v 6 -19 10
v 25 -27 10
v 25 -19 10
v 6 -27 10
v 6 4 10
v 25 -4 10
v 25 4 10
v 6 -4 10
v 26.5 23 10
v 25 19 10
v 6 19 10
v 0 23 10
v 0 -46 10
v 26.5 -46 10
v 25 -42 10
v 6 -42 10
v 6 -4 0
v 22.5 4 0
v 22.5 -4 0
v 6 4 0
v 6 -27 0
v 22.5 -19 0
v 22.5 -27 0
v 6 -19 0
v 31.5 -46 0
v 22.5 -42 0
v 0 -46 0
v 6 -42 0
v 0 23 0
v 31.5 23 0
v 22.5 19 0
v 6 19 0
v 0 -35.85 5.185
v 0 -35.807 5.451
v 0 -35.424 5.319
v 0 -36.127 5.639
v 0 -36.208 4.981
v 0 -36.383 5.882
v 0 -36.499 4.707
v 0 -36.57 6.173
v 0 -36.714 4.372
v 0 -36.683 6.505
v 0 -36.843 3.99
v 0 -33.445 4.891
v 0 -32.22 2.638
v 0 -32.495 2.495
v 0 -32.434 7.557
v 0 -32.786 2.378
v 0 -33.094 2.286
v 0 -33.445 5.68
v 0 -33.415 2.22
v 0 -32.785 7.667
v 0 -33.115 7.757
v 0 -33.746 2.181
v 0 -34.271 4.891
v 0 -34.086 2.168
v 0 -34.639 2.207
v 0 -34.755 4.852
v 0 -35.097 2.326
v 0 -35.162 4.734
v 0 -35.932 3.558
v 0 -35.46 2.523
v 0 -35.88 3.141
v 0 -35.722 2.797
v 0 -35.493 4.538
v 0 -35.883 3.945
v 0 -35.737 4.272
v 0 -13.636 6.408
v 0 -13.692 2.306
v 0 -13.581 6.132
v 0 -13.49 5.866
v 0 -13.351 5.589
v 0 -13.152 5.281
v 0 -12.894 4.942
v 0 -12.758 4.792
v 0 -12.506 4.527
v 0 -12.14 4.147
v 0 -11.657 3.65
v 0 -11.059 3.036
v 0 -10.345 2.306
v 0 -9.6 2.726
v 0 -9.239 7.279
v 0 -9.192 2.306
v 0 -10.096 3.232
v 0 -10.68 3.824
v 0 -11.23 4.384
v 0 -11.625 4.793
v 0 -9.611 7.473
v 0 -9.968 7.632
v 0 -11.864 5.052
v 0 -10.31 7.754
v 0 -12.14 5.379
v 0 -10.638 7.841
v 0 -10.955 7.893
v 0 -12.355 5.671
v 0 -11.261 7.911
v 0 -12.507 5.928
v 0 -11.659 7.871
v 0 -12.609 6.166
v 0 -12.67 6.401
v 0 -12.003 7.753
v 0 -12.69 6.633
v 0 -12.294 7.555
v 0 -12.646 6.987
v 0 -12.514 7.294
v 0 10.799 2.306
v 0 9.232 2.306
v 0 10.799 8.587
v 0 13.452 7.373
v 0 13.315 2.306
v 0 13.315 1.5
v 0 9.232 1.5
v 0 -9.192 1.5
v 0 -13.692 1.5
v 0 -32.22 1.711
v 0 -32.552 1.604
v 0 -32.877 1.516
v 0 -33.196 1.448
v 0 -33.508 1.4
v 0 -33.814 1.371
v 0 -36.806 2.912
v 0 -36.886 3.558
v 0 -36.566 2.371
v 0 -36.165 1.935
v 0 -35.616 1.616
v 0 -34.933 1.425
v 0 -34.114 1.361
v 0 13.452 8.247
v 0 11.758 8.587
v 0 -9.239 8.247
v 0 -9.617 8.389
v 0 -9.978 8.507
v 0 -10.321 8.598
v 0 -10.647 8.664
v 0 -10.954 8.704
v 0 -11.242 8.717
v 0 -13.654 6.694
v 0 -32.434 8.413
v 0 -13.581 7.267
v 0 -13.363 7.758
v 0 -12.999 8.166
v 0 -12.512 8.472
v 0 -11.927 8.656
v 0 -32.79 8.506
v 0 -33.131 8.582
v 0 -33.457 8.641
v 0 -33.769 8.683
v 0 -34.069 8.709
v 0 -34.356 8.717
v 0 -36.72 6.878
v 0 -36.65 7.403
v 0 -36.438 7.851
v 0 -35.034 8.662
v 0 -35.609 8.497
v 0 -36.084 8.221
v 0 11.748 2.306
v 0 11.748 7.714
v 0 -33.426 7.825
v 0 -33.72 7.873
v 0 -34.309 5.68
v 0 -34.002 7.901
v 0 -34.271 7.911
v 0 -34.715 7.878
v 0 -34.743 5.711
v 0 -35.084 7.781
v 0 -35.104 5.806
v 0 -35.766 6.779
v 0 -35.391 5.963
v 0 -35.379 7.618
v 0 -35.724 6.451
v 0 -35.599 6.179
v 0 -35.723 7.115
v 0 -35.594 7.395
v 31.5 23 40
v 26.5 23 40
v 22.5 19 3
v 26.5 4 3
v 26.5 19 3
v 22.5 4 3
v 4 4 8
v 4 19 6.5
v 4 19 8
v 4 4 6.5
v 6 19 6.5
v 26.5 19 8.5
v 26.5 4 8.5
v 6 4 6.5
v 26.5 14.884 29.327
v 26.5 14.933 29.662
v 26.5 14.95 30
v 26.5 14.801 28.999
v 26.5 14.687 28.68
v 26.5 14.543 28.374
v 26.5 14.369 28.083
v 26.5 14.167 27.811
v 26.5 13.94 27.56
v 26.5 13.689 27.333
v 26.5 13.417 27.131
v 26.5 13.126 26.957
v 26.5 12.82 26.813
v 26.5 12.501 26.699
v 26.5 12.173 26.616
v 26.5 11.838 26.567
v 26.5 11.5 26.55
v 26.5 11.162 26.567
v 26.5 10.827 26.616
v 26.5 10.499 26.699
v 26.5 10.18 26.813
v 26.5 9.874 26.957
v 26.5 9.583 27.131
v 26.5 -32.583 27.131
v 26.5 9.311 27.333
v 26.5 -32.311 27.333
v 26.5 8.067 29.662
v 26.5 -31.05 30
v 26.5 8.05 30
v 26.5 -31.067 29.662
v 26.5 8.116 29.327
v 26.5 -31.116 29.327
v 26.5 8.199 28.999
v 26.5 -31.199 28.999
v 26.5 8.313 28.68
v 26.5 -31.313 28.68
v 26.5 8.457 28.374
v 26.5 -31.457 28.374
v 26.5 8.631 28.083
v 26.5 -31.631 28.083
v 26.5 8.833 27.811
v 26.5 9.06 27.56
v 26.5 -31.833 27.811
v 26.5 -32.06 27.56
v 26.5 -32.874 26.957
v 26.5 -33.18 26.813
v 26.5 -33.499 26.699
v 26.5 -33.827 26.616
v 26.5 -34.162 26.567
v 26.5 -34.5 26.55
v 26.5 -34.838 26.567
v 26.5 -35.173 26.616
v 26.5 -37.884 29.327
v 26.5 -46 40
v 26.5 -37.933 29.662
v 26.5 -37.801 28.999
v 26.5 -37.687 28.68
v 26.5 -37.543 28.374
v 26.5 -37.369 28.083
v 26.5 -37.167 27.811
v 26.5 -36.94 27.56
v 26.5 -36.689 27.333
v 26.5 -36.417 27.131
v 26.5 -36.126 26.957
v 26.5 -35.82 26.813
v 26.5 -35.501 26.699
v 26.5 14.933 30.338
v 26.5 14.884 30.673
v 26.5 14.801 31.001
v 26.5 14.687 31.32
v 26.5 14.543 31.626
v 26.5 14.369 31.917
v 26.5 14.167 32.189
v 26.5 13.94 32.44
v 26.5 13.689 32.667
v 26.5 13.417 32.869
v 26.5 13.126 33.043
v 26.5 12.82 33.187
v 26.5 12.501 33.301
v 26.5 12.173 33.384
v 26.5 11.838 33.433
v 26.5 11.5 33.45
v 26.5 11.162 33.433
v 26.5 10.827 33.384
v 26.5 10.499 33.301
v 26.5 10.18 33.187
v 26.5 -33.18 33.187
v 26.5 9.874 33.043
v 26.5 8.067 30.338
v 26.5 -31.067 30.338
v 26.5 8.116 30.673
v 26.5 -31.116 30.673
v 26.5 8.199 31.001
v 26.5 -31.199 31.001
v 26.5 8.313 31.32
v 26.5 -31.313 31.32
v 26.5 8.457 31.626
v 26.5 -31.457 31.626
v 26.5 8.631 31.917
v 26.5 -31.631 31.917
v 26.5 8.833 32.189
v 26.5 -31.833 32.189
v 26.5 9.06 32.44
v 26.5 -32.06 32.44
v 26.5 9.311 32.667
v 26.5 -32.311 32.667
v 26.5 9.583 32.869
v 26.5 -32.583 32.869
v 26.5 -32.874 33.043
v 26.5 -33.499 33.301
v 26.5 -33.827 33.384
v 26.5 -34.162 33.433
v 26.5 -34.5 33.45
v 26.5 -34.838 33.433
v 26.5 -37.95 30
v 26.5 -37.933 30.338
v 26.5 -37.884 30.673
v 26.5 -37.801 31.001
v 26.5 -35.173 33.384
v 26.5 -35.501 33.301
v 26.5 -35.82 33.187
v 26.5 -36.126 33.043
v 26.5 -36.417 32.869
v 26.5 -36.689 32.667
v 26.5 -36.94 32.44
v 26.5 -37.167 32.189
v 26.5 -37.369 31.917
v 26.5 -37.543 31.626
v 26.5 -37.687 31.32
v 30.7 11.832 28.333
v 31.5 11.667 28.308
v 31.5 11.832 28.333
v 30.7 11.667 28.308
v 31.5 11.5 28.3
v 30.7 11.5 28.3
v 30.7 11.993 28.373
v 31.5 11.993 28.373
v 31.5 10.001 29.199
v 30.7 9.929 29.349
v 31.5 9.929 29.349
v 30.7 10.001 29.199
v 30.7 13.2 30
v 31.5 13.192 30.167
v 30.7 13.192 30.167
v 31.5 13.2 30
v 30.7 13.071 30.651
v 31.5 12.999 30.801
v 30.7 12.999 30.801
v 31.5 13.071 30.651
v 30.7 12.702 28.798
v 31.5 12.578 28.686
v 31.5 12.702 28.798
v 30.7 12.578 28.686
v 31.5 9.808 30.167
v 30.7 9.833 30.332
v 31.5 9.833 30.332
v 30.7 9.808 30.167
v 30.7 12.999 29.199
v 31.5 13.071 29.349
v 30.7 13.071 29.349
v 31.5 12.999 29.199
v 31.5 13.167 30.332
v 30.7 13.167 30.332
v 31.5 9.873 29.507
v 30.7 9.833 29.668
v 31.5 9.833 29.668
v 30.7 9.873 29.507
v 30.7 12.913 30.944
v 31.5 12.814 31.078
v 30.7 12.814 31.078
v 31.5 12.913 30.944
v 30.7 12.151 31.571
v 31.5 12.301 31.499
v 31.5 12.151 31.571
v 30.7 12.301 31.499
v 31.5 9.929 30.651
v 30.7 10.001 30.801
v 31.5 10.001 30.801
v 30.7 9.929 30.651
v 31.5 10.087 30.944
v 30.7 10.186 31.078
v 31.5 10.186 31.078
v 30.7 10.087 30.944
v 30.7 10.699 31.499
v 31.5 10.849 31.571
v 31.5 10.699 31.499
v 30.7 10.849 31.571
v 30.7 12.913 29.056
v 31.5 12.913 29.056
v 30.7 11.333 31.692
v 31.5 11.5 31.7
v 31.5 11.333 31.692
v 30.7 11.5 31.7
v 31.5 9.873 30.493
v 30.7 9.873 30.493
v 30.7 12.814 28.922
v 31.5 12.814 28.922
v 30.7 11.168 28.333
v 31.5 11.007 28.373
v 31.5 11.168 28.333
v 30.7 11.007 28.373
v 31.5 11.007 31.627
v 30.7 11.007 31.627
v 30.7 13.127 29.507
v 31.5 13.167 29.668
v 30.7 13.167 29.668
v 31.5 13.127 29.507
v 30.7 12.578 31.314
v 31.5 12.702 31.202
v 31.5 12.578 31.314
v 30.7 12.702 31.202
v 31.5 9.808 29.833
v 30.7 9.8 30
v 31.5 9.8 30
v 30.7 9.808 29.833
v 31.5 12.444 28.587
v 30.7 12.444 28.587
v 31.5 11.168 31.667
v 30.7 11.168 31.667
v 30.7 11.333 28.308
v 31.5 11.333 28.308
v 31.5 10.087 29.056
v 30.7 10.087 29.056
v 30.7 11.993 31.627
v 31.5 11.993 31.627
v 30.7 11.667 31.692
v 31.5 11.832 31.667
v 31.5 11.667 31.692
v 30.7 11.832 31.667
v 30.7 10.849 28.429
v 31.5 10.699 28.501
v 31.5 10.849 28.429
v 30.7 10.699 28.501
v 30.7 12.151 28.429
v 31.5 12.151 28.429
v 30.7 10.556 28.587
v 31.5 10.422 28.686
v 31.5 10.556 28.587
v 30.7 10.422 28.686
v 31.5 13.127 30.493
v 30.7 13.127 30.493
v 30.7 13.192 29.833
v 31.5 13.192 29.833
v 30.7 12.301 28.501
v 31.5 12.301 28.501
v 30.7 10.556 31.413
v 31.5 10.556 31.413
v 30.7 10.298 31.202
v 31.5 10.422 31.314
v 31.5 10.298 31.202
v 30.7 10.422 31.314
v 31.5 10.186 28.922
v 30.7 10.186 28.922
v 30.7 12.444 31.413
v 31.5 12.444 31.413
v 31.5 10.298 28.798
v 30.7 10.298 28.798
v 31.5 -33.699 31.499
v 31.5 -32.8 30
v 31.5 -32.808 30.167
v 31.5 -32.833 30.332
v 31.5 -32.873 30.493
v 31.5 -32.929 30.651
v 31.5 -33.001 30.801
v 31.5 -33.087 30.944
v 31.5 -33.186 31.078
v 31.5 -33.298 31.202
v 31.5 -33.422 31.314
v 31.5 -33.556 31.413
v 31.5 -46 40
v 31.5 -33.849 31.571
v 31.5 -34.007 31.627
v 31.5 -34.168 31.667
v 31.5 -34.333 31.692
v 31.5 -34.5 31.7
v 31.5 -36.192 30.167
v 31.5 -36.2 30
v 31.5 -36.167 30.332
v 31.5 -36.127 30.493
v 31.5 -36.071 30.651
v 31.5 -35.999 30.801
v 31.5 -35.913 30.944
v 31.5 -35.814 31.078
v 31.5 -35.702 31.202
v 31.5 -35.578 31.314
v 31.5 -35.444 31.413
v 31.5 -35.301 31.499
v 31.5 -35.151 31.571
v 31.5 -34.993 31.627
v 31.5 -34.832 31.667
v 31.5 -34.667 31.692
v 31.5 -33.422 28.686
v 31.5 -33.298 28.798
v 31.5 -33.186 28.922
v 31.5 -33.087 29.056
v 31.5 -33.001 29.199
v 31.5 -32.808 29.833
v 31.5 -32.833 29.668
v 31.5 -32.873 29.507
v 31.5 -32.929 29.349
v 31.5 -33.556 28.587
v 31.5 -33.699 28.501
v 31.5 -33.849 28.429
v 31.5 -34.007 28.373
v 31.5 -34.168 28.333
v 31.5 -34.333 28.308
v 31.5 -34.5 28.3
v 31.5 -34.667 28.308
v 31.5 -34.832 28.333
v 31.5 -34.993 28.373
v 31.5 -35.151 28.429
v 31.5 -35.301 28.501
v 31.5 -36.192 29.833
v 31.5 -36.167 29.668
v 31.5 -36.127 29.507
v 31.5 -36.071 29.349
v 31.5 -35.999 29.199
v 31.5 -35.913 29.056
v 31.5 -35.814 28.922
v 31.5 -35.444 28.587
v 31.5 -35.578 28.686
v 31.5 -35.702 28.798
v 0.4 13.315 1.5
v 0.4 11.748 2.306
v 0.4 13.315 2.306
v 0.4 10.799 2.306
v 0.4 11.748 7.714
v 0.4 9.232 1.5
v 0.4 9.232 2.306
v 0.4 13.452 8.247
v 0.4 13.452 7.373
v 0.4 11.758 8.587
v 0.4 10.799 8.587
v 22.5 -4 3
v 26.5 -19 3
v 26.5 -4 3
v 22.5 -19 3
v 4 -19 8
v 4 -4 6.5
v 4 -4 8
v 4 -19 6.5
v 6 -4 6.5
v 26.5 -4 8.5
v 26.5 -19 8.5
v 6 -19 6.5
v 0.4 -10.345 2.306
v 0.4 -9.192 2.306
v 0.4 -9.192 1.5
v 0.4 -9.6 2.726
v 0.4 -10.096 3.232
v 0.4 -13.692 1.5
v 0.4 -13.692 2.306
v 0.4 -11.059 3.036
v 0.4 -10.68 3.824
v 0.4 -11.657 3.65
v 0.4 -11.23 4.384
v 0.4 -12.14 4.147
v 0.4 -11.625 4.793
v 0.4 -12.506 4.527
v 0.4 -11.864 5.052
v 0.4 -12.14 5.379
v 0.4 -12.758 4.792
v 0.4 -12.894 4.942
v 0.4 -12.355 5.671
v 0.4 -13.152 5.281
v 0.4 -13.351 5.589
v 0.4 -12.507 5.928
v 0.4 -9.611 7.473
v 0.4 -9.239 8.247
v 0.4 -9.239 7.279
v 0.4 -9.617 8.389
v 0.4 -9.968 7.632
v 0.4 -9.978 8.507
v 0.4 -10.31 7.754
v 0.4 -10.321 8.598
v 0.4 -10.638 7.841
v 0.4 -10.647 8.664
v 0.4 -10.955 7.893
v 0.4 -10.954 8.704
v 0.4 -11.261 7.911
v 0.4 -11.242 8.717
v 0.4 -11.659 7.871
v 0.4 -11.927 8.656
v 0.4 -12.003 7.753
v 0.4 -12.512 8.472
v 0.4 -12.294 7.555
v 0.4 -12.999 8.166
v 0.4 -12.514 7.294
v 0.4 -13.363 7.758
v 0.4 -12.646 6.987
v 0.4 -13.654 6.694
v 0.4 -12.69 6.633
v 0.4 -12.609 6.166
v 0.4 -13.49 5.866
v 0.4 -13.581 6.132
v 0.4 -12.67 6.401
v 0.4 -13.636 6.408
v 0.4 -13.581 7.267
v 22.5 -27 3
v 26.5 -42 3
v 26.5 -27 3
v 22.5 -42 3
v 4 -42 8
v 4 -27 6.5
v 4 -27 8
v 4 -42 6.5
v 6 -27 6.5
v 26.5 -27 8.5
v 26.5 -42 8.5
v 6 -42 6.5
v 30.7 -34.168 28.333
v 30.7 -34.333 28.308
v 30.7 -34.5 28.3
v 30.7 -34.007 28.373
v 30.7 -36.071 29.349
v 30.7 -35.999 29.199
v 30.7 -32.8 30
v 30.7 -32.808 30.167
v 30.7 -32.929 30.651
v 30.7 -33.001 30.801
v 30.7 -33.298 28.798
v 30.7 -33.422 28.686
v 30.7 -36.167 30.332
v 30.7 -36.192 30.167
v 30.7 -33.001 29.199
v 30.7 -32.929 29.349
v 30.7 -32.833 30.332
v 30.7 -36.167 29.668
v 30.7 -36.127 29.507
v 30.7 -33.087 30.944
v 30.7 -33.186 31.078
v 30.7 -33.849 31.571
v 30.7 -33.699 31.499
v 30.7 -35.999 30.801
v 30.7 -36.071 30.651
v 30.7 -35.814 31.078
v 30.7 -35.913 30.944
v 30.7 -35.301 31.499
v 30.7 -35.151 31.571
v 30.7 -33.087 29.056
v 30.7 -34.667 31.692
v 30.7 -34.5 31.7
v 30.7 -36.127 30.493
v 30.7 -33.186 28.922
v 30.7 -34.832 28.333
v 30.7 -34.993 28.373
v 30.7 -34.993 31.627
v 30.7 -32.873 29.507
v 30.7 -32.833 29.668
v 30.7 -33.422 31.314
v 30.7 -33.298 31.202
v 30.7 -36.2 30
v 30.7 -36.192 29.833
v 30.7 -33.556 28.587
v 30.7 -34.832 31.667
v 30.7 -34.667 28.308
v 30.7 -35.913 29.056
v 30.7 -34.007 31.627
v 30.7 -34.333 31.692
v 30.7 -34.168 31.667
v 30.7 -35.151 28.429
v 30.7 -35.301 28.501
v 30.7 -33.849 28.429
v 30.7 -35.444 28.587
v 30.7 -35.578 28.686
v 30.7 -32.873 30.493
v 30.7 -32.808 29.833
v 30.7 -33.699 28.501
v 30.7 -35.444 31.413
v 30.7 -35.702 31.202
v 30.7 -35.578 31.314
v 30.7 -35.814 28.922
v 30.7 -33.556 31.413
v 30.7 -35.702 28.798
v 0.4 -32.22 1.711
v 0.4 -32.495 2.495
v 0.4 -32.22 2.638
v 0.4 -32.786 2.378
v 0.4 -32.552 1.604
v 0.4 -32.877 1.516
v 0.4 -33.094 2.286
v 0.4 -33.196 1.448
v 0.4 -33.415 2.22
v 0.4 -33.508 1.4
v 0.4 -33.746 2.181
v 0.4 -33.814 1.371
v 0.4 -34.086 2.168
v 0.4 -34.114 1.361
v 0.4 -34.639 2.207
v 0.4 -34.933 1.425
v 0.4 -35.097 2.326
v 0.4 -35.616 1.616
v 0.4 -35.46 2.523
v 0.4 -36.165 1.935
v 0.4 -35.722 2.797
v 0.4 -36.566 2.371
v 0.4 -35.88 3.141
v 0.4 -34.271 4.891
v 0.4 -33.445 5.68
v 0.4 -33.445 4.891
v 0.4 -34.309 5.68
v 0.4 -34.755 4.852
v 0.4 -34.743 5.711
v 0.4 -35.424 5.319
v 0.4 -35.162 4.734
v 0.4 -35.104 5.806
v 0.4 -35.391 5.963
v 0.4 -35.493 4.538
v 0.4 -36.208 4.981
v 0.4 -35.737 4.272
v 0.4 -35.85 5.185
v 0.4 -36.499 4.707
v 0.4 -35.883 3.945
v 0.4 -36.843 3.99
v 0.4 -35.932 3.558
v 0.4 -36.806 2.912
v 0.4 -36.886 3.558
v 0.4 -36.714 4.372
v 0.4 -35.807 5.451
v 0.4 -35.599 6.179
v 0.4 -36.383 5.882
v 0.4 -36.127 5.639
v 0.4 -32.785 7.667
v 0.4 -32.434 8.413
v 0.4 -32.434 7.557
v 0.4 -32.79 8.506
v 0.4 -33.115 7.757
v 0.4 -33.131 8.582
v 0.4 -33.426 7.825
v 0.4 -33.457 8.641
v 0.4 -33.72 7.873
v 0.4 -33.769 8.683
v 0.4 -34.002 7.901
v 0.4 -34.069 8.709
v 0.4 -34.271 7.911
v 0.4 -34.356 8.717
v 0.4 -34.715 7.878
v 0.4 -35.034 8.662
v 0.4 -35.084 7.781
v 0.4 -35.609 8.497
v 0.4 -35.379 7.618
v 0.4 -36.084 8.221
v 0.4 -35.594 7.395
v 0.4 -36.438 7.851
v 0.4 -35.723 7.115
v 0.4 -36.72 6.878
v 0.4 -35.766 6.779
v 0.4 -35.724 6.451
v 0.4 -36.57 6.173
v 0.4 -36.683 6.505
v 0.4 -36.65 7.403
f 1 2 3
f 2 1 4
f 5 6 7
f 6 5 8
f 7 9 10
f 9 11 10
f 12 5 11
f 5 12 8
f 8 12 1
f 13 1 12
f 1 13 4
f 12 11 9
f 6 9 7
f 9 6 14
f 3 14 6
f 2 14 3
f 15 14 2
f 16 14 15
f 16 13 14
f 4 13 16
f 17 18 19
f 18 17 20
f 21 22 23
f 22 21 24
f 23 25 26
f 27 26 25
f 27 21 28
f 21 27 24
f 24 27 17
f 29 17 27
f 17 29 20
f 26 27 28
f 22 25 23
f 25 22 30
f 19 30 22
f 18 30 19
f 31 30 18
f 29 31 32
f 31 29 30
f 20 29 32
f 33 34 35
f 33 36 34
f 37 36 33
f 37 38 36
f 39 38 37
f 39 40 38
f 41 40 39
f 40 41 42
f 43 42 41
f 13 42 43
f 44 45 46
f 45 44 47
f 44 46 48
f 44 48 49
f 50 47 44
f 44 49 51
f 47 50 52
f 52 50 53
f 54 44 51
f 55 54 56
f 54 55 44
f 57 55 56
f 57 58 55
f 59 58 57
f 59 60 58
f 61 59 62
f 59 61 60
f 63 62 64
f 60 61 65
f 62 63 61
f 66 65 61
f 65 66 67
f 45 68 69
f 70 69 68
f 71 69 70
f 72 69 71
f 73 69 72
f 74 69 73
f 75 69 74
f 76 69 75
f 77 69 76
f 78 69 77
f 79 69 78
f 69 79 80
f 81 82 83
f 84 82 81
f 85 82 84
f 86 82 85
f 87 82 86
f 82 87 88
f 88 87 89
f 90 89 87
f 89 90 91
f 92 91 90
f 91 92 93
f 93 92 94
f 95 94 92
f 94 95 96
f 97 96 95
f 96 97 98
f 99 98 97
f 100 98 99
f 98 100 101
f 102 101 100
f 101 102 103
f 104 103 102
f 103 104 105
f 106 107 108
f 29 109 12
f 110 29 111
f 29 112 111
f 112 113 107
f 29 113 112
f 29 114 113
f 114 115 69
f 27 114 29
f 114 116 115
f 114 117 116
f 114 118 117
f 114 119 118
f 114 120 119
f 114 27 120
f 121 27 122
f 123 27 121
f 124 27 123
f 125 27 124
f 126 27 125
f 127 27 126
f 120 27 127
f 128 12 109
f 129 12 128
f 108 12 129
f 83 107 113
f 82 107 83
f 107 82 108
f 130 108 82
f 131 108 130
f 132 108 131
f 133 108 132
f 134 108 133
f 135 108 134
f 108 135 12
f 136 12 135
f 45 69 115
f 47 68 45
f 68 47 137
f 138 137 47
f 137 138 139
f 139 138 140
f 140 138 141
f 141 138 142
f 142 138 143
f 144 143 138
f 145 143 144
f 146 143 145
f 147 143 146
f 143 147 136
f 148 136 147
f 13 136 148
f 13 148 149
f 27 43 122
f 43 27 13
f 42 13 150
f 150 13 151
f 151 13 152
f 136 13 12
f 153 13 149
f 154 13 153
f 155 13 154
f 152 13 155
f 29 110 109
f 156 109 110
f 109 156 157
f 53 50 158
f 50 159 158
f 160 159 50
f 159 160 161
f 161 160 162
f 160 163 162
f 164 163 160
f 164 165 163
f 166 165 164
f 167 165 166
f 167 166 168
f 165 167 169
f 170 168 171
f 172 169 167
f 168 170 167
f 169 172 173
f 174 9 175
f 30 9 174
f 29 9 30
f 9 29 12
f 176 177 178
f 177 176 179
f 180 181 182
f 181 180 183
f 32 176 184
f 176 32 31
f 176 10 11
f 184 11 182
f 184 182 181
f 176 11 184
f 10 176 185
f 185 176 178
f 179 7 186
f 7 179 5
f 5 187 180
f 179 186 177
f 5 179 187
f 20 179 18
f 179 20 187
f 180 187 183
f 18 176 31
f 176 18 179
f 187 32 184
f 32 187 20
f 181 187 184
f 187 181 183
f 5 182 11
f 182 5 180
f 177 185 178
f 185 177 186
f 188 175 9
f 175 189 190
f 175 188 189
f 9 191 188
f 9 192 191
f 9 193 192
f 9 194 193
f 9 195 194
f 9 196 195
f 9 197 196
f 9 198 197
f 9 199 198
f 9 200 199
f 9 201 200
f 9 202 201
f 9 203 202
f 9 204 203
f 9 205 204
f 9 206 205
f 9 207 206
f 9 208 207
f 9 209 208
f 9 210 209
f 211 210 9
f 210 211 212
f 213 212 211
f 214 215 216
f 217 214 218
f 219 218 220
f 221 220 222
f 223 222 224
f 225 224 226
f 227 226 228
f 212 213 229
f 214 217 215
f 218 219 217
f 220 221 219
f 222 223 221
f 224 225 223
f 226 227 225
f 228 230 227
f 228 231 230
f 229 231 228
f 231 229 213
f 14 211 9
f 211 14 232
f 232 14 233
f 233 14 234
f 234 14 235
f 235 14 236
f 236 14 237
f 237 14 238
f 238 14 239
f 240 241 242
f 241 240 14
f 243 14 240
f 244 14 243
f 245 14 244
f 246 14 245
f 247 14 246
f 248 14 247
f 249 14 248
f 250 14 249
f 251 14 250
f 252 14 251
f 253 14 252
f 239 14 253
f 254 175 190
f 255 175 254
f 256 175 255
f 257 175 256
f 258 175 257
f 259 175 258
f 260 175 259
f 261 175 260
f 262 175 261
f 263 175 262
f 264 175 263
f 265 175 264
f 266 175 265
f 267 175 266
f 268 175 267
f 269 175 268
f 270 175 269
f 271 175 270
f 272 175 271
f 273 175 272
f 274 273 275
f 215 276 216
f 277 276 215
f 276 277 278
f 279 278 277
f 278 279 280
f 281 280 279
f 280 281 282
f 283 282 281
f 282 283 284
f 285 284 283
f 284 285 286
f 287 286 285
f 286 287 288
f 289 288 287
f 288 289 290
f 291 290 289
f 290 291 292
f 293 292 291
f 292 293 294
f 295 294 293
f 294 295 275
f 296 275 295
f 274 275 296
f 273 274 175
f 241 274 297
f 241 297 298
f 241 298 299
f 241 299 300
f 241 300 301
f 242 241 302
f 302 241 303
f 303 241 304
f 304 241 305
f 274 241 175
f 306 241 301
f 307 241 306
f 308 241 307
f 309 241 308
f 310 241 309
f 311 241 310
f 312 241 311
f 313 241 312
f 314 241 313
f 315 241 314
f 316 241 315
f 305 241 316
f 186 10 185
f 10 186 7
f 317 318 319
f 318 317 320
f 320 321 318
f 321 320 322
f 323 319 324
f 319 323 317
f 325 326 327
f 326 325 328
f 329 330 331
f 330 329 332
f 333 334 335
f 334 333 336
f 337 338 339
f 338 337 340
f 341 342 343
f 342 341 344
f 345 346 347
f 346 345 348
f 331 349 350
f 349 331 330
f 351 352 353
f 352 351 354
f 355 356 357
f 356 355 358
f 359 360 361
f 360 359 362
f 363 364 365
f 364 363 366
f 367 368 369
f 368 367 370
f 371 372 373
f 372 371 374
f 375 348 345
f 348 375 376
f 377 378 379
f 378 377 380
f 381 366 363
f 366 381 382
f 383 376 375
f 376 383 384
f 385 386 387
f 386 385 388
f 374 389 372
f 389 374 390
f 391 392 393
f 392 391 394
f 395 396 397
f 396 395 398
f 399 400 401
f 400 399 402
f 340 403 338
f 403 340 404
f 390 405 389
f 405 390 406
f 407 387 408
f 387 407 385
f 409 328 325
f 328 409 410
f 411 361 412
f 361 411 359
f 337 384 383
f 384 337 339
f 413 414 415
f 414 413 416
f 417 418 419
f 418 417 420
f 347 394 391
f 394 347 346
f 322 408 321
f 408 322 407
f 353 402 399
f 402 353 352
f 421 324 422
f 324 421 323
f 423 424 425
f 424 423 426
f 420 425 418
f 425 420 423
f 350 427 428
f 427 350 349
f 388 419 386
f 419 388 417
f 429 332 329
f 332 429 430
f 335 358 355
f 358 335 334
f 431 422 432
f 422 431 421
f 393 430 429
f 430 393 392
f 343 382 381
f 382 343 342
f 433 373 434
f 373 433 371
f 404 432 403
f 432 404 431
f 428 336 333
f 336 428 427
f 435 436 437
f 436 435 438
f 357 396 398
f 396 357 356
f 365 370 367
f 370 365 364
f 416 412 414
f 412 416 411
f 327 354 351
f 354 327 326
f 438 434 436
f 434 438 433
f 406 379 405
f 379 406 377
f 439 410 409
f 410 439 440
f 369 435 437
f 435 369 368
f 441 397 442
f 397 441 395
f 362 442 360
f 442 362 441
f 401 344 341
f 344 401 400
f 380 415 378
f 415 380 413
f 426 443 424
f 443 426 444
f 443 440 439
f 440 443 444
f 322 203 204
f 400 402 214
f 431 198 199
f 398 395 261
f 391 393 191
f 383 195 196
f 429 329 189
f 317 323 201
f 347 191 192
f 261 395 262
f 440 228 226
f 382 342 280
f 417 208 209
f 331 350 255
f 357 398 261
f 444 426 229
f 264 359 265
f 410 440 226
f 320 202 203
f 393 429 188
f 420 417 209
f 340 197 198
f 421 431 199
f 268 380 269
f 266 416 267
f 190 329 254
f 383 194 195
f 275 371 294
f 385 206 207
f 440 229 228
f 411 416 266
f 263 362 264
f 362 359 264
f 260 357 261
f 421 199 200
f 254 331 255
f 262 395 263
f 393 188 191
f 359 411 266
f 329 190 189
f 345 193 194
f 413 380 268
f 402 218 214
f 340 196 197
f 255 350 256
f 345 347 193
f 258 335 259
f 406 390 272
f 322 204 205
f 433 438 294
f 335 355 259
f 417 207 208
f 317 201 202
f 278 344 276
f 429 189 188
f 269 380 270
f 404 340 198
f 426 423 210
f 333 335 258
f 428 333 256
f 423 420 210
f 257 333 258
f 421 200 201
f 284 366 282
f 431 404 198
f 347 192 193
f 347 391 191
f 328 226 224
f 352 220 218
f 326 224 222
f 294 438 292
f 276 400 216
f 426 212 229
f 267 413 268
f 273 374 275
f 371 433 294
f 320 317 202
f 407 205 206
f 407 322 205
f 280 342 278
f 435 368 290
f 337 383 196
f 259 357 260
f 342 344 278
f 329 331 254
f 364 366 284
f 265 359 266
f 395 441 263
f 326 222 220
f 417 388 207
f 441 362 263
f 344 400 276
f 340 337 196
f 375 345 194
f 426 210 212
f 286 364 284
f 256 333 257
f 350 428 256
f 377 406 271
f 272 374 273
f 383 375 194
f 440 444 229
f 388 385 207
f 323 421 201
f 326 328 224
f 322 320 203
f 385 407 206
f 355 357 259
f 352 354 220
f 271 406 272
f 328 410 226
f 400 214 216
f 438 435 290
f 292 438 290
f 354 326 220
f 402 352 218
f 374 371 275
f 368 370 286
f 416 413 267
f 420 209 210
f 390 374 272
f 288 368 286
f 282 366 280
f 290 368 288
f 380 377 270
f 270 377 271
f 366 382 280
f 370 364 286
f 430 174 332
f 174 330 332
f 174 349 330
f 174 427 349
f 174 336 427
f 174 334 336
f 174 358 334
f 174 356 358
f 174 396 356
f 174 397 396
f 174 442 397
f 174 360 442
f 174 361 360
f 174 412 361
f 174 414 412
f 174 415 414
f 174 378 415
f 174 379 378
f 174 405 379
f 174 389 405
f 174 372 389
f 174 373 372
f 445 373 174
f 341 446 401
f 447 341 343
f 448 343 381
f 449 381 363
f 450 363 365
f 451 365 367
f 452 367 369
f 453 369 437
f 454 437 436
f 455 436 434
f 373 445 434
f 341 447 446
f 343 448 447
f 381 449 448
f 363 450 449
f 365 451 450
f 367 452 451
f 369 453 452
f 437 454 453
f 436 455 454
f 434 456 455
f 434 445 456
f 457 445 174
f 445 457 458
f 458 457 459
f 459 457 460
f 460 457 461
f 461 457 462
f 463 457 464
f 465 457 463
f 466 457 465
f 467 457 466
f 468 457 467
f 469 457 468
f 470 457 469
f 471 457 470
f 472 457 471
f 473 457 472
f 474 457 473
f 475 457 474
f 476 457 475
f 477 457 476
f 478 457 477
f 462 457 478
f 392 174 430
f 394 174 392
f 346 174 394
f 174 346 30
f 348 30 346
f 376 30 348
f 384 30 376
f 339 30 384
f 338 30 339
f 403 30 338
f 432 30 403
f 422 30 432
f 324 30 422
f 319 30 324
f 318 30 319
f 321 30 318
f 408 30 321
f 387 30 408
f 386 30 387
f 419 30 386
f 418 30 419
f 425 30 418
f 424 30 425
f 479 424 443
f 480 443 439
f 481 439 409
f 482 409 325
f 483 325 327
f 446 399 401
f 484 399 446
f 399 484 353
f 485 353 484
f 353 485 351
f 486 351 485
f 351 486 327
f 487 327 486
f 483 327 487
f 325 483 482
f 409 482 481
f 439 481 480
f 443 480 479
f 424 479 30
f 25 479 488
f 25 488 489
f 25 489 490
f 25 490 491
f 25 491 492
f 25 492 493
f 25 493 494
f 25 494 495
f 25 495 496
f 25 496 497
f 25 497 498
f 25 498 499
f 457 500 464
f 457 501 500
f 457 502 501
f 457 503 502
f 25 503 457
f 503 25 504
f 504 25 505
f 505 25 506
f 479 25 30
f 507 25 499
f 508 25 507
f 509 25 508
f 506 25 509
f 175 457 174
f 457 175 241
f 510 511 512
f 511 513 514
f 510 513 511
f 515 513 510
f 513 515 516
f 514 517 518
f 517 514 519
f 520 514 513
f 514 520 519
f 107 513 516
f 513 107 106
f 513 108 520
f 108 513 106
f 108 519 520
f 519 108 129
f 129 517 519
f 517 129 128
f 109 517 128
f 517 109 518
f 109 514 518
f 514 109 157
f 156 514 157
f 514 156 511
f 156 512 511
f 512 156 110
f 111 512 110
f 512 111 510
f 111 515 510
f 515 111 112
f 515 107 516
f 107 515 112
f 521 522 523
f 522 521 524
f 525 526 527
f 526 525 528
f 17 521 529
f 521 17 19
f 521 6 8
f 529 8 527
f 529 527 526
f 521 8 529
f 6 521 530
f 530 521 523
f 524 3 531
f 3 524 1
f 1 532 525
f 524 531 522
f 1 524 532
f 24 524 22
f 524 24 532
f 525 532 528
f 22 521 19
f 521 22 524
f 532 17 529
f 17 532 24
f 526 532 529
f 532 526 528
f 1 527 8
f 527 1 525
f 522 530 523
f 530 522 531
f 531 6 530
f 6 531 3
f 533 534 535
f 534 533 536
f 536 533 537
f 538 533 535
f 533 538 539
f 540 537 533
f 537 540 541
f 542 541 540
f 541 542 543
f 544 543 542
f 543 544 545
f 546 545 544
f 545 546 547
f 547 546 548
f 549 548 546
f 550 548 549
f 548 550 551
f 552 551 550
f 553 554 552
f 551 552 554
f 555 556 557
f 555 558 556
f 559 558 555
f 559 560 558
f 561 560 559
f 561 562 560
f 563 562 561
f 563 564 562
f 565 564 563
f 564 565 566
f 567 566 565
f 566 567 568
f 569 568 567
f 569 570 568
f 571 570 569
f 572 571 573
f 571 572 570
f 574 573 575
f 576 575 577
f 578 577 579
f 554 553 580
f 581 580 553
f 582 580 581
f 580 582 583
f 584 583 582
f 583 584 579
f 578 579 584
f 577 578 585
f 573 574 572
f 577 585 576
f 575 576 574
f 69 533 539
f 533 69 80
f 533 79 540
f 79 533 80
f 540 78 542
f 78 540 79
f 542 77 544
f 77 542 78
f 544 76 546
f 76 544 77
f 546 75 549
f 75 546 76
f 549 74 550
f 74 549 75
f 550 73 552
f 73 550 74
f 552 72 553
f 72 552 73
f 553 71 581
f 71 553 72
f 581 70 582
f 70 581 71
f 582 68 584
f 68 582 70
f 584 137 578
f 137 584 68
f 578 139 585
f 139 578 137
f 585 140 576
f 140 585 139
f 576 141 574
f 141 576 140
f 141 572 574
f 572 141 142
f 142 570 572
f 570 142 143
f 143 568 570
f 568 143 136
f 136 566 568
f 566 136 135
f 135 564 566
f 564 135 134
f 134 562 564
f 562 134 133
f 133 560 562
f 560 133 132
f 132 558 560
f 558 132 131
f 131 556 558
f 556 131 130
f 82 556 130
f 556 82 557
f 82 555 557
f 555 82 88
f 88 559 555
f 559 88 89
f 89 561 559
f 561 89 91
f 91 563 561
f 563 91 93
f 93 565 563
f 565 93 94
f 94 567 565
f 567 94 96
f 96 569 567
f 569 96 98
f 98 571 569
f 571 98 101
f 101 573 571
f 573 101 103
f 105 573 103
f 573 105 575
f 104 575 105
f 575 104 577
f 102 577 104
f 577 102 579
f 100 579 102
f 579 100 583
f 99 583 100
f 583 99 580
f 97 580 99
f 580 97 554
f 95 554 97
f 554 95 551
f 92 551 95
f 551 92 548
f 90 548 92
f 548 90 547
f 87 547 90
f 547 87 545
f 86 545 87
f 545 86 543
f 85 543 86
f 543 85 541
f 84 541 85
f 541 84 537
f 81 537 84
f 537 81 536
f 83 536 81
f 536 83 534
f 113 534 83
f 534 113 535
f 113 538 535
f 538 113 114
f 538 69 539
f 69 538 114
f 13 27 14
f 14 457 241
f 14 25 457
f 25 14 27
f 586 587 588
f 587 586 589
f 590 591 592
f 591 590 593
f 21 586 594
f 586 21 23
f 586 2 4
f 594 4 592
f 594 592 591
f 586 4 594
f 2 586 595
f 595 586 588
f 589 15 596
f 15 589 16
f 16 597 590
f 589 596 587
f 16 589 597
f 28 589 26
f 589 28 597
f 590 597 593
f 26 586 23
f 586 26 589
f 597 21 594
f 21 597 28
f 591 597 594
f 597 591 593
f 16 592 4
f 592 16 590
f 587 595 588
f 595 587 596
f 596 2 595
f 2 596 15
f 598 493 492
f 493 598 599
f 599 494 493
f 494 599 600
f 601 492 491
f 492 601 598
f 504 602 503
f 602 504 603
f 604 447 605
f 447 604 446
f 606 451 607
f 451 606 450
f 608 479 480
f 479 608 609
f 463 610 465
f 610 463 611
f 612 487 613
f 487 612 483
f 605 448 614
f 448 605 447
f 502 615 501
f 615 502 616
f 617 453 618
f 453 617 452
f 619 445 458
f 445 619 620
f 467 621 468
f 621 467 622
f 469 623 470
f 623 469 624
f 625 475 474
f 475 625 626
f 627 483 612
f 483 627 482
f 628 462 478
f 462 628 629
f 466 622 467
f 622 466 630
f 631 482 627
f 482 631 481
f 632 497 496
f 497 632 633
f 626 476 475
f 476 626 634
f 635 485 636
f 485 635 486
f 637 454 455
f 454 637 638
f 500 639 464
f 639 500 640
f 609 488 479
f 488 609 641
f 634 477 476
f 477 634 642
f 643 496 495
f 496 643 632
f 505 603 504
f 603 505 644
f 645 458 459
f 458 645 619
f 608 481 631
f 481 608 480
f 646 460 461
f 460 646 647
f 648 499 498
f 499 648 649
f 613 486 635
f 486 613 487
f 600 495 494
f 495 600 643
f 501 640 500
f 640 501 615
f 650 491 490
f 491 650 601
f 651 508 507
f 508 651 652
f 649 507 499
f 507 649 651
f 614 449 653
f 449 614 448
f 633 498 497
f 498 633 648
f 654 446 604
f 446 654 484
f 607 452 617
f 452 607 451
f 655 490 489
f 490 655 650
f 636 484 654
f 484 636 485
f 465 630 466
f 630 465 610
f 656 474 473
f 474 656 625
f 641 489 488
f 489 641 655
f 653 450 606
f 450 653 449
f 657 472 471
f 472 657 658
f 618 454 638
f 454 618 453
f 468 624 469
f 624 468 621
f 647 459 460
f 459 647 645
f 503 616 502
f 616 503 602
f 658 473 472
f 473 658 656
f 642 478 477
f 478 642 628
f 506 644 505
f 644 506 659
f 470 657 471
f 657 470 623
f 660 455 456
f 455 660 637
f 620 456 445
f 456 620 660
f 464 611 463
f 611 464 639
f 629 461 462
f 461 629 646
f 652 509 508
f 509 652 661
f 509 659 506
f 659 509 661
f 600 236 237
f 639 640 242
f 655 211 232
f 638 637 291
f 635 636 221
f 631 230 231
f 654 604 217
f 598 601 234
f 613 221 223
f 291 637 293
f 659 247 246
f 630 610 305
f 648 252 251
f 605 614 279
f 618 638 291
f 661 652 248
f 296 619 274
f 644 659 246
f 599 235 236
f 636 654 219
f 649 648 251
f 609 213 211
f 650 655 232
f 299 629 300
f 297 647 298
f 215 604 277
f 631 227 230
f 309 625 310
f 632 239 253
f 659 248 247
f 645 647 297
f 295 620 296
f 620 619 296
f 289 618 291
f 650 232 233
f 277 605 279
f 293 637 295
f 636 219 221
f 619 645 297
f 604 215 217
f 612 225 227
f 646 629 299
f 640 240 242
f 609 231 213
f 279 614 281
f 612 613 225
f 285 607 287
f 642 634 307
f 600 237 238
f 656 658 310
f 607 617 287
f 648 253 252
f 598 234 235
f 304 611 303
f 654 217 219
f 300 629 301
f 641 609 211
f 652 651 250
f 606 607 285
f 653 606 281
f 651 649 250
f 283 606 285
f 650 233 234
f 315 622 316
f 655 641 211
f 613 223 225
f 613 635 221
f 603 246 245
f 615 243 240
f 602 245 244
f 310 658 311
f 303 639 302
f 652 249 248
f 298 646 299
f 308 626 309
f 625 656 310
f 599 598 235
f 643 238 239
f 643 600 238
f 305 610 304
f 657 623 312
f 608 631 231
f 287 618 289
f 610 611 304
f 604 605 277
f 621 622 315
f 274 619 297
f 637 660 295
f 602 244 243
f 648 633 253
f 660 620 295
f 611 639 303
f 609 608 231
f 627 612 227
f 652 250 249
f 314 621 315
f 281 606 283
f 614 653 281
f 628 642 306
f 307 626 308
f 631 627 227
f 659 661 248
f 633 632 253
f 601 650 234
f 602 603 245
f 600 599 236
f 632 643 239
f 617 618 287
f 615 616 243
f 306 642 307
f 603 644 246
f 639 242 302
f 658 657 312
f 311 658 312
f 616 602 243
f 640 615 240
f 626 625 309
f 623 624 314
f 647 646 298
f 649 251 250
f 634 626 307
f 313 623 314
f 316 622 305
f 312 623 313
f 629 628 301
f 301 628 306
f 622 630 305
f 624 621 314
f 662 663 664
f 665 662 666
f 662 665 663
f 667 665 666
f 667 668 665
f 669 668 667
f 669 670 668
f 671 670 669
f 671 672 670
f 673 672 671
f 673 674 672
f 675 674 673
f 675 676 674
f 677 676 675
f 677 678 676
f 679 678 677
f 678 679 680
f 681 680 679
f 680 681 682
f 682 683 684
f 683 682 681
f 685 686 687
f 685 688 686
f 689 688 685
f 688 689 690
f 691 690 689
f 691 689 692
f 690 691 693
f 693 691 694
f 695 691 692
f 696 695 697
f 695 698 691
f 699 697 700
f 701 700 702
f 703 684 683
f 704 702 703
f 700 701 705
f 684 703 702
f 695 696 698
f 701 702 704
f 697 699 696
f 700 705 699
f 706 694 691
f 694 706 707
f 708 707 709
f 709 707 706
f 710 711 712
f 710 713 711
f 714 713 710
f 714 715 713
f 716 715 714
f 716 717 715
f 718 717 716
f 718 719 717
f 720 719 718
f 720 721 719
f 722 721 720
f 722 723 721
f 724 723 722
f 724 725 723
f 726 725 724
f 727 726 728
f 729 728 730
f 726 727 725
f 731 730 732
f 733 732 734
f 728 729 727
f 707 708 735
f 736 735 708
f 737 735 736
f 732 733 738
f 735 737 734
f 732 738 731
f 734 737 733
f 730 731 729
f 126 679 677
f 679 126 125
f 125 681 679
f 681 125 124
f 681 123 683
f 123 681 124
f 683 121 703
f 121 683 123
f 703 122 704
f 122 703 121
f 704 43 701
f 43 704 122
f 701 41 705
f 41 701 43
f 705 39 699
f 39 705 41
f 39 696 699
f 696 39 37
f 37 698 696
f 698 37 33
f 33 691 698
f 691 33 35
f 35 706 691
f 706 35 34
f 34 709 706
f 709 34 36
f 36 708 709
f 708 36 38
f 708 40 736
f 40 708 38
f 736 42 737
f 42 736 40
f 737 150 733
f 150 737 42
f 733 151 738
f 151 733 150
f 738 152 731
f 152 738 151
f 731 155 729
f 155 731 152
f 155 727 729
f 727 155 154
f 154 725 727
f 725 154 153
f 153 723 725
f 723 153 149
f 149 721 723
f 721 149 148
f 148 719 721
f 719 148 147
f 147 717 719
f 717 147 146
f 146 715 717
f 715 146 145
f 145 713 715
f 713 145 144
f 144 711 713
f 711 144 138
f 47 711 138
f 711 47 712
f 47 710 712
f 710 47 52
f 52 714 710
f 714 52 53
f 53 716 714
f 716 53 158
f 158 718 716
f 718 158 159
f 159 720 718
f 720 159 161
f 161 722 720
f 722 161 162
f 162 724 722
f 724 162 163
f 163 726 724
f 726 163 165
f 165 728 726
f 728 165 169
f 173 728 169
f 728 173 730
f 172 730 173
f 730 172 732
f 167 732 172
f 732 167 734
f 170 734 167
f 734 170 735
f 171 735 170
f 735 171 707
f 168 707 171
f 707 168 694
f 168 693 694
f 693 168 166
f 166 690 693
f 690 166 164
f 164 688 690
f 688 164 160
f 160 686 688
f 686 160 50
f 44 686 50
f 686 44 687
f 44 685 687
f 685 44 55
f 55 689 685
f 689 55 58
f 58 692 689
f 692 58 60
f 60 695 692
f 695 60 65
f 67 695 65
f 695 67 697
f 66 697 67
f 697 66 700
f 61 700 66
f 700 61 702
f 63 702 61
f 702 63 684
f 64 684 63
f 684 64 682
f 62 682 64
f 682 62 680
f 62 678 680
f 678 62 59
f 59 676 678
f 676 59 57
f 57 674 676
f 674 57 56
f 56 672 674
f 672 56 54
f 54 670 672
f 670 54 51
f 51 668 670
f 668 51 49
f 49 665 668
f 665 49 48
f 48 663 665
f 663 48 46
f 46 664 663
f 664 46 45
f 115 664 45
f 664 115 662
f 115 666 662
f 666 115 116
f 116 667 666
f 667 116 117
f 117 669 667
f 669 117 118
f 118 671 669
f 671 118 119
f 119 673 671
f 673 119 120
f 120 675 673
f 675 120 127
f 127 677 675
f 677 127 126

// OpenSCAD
//number of keystone sockets
number_of_sockets=3; //[1:1:20]

//depth of the wallmount (mm)
wallmount_depth=5; //[0:1:100]

//height of the wallmount (mm)
wallmount_height=40; //[10:1:100]

//offset of wallmount to the keystone
wallmount_offset=0; //[0:1:100]

//number the ports
text_enabled=true;

//depth of the numbers  (mm)
text_depth=0.4;

//screw holes in wallmount
screw_hole=true;

//positions that have screw holes
holes_at=[1,0,1,0,0,0,0,0,0,0,0,0,0,0,0,0];

//wallmount_screw_offset
wallmount_screw_offset=10;

//diameter of the screw  (mm)
screw_diameter=3.4;

//height of the screw head  (mm)
screw_head_length=4.2;

//diamter of the screw head  (mm)
screw_head_diameter=6.9;


/* Hidden */
front=false;
text_ltr=-1;

/* ************************************************************
 * Keystone code is from https://www.thingiverse.com/thing:6647
 * Mounting plate for keystone jack
 * by jsadusk https://www.thingiverse.com/jsadusk
 *
 * Changes 
 * - catch_hangover from 3 to 2 (line 26)
 * - X translate of the clip_catch from 28.5 to 29 (line 76)
 */
/* Hidden */
jack_length =16.5;
jack_width = 15;

wall_height = 10;
wall_thickness = 4;

catch_overhang = 2;
small_clip_depth = catch_overhang;
big_clip_depth = catch_overhang + 2;
big_clip_clearance = 3; //4
small_clip_clearance = 6.5;

outer_length = jack_length + small_clip_depth + big_clip_depth +
                            (wall_thickness * 2);
outer_width = jack_width + (wall_thickness * 2);

module clip_catch() {
  rotate([90, 0, 0]) {
    linear_extrude(height = outer_width) {
      polygon(points = [[0,0],
                                       [catch_overhang,0],
                                       [wall_thickness,catch_overhang],
                                       [0,catch_overhang]],
                      paths = [[0,1,2,3]]);
    }
  }
}

module keystone() {
union() {

difference() {
  difference() {
    cube([outer_length, outer_width, wall_height]);
   translate([wall_thickness, wall_thickness, big_clip_clearance]) {
      cube([outer_length, jack_width, wall_height]);
    }
  }
  translate([wall_thickness + small_clip_depth, wall_thickness, 0]){
    cube([jack_length, jack_width, wall_height + 1]);
  }
}

cube([wall_thickness, outer_width, wall_height]);

cube([wall_thickness + small_clip_depth,
           outer_width, small_clip_clearance]);

translate([2, 23, 8]) {
  clip_catch();
}

translate([26.5,0,0]) {
  cube([4, 23, 10]);
}

translate([29, 0, 8]) { //28.5,0,8
  rotate([0, 0, -180]) {
    clip_catch();
  }
}


}
}
/* ************************************************************
 * end of https://www.thingiverse.com/thing:6647 code
 */

module screw()
{
	$fn=64;
	
	translate([screw_head_length,0,0])
	rotate([0,90,0])
		union()
		{
			cylinder(h=wallmount_depth,d=screw_diameter);
			translate([0,0,-screw_head_length])
				cylinder(r1=screw_head_diameter/2,r2=screw_diameter/2,screw_head_length);
			translate([0,0,-screw_head_length-100])
				cylinder(h=100,d=screw_head_diameter);
		}
}

module wallmount(hole=false)
{
	keystone();

	translate([outer_length-4+wallmount_offset,0,0])
	{
		difference()
		{
			union()
			{
				cube([wallmount_depth,outer_width,wallmount_height]);
				translate([-wallmount_offset+1,0,0])
					cube([wallmount_offset,outer_width,wall_height]);
			}
			union()
			{
				if(hole && screw_hole)
				{
					translate([0,outer_width/2,wallmount_height-wallmount_screw_offset])
						screw();
				}
			}
		}
	}
	
	if(front)
	{
		difference()
		{
			translate([0,0.2,0])
				cube([1,outer_width-0.4,wallmount_height]);
			
			union()
			{
				if(hole && screw_hole)
				{
					translate([0,outer_width/2,wallmount_height-wallmount_screw_offset])
						screw();
				}
			}
		}
	}
}

for(i=[1:1:number_of_sockets])
{
	translate([0,text_ltr*(i-1)*outer_width,0])	
	{
		difference()
		{
			if(holes_at[i-1]==1)
			{
				wallmount(hole=true);
			}
			else
			{
				wallmount(hole=false);
			}
		
			if(text_enabled)
			{
				translate([text_depth,outer_width/2,1.5])
					rotate([90,0,0])
						rotate([0,-90,0])
							linear_extrude(text_depth)
								text(text=str(i),size=7,halign="center",font="DejaVu Sans:style=Regular");
			}
		}
	}
}
